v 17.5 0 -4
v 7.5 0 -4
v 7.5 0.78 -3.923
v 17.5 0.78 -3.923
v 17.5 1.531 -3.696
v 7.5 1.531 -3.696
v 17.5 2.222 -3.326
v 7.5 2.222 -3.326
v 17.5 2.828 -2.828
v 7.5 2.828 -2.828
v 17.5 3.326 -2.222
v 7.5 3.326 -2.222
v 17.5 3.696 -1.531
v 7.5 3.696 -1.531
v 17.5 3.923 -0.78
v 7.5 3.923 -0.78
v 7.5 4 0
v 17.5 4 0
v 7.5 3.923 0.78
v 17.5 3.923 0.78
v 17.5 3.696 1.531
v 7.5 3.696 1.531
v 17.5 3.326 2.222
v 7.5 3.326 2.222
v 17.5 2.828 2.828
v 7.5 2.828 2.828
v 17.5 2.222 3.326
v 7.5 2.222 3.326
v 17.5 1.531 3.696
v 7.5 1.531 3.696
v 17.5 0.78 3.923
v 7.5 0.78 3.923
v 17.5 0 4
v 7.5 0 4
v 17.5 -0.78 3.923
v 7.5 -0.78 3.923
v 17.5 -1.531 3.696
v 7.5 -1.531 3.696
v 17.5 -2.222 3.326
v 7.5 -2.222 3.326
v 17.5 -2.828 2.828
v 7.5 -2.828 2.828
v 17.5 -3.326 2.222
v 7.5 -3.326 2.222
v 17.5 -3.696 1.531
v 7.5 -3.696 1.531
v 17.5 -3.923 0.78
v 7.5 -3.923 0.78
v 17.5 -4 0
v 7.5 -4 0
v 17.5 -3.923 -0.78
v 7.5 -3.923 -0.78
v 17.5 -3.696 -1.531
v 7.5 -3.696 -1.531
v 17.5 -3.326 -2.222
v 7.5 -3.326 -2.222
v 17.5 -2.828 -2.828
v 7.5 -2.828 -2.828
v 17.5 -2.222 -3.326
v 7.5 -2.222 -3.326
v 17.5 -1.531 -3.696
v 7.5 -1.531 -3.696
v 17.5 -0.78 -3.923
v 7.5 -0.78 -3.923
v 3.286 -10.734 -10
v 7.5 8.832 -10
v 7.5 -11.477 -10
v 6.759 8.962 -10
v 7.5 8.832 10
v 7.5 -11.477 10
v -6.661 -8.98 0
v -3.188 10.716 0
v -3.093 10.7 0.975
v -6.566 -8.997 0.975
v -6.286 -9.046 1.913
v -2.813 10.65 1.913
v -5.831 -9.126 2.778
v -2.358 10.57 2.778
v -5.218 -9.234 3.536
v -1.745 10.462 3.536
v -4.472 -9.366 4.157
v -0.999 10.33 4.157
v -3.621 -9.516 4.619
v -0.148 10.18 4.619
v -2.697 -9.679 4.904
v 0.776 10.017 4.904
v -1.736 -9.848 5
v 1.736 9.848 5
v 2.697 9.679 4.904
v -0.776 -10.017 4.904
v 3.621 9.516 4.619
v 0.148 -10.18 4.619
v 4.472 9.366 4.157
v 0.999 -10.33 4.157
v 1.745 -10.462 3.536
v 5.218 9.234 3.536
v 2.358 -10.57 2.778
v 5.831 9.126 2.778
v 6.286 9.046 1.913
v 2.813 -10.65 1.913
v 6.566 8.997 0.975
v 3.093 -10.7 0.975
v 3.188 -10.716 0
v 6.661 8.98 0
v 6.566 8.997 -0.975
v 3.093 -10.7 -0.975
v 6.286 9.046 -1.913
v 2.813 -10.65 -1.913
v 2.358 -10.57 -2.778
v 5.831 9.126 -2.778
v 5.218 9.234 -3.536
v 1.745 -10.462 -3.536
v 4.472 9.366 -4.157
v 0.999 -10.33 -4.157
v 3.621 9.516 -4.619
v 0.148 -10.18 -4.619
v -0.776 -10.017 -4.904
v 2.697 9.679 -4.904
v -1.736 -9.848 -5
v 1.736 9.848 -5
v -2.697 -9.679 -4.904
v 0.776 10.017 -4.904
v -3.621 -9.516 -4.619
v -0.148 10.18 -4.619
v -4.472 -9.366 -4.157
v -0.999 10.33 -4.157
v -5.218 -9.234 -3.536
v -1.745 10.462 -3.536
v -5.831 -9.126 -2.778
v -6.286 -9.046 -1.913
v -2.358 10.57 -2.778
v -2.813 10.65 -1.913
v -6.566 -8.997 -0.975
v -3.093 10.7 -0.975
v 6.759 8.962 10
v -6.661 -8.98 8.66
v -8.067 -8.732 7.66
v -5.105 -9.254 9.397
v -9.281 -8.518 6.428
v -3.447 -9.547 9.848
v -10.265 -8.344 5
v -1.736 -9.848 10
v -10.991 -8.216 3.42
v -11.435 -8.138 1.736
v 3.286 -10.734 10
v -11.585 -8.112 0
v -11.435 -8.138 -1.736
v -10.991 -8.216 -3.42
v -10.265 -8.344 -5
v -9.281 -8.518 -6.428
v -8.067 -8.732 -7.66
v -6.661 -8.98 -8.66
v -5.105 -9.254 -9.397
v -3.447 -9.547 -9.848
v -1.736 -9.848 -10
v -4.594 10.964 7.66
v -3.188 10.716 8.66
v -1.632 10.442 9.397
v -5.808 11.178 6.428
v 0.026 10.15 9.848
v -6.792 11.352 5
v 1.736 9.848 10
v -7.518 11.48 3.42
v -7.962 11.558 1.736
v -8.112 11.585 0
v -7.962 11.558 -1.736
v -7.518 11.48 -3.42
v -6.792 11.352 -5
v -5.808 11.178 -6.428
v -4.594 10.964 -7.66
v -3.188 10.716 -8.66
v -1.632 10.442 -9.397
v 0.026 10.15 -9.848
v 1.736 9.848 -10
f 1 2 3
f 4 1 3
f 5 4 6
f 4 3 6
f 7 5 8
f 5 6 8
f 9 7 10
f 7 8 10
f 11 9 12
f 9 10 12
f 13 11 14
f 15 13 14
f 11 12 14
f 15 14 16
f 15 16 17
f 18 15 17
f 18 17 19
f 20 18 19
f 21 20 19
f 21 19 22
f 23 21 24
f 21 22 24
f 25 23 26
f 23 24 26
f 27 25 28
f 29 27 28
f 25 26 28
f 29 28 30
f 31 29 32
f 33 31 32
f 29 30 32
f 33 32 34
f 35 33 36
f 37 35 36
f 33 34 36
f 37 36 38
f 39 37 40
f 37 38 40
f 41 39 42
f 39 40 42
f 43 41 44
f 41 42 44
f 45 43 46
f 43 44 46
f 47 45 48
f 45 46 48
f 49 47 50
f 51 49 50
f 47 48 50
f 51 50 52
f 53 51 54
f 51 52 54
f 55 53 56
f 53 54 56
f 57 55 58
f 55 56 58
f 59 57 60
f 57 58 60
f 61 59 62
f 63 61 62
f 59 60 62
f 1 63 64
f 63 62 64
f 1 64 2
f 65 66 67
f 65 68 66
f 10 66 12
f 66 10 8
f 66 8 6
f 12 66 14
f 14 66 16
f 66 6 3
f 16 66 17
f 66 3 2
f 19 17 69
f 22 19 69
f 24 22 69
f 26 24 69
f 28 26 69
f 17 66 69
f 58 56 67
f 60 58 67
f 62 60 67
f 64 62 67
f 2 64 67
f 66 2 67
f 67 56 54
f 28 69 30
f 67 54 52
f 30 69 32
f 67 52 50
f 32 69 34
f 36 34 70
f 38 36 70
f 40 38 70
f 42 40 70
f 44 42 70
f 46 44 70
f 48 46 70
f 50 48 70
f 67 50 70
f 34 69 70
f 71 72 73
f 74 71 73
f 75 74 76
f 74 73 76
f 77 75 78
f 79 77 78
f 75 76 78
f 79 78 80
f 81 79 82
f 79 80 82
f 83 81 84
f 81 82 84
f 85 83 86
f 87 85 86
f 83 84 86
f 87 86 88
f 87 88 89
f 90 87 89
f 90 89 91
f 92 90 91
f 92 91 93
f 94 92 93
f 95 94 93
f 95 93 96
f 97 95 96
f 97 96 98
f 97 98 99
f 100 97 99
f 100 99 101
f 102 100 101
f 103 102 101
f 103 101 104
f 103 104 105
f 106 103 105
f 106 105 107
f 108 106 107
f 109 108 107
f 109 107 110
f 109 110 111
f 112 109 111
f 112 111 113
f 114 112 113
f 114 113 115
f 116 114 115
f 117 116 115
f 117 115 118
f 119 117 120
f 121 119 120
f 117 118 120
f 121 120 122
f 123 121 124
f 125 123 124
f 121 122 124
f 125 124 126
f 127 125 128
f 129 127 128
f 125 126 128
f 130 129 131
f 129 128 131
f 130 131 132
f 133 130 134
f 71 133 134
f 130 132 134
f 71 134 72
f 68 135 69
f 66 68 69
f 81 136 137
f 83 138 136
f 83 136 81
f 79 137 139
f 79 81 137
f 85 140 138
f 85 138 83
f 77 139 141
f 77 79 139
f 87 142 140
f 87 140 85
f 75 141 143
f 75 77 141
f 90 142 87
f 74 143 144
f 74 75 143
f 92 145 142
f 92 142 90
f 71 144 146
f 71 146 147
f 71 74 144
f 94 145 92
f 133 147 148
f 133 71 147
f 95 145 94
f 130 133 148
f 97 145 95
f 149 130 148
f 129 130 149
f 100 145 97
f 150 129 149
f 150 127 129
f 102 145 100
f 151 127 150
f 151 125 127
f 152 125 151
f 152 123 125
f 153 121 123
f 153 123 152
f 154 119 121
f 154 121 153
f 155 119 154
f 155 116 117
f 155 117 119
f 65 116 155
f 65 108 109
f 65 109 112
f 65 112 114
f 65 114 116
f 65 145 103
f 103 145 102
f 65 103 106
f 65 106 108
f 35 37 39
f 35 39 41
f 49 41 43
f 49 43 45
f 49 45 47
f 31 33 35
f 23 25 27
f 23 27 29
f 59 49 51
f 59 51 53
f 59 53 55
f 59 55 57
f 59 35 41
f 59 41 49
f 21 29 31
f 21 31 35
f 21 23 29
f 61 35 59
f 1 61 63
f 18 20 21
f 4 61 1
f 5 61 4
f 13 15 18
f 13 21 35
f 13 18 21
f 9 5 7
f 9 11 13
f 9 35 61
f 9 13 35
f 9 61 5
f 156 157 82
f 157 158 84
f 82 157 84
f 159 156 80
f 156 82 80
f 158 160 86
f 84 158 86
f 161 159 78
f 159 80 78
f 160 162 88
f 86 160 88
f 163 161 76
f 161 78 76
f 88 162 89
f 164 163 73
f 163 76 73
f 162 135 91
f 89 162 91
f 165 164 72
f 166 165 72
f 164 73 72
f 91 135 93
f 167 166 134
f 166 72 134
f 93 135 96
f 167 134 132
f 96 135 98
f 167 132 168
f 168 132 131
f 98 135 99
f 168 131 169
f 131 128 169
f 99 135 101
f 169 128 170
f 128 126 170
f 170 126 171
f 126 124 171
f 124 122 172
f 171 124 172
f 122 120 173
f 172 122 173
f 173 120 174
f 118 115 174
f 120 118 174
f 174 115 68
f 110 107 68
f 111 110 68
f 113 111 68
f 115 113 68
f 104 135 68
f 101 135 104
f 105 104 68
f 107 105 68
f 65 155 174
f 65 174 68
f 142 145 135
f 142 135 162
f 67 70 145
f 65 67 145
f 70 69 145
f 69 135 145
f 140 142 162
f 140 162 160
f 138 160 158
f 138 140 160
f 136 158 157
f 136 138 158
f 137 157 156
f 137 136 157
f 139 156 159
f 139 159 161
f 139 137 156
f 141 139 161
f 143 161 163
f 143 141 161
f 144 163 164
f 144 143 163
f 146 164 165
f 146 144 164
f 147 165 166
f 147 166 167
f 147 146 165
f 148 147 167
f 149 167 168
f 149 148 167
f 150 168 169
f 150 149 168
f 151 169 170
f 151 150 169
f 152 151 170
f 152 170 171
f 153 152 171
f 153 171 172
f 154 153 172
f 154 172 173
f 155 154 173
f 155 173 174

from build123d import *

# Parameters (mm, degrees)
EXTRUDE_3_DEPTH      = 10
EXTRUDE_3_DEPTH_BACK = 10
SKETCH_3_R           = 5
CUT_EXTRUDE_1_DEPTH  = 27.477518989
EXTRUDE_6_DEPTH      = 10
EXTRUDE_6_DEPTH_BACK = 10
SKETCH_9_R           = 4
EXTRUDE_8_DEPTH      = 10


with BuildPart() as part:
    # Sketch 3D_4 → ﾎﾞｽ - 押し出し3 (new, two sides: drawn at the far end of the back side and taken through both)
    with BuildSketch(Plane(origin=(0, 0, -10), x_dir=(0.24333901077648587, -0.042907233058801585, 0.9689917931466494), z_dir=(0.17364817766692725, 0.9848077530122086, 0)).offset(-EXTRUDE_3_DEPTH_BACK)):
        with BuildLine():
            Line((0, 0), (1.260173827, 4.941858145))
            Line((1.260173827, 4.941858145), (20.64000969, 0))
            Line((20.64000969, 0), (19.379835863, -4.941858145))
            ThreePointArc((19.379835863, -4.941858145), (7.218988859, -12.160847004), (0, 0))
        make_face()
    extrude(amount=EXTRUDE_3_DEPTH + EXTRUDE_3_DEPTH_BACK)

    # ｽｹｯﾁ3 → ｶｯﾄ - 押し出し1 (cut, through all)
    with BuildSketch(Plane(origin=(1.736481777, 9.84807753, 0), x_dir=(0.9848077530122086, -0.17364817766692736, 0), z_dir=(0.17364817766692736, 0.9848077530122086, 0))):
        Circle(SKETCH_3_R)
    extrude(amount=-CUT_EXTRUDE_1_DEPTH, mode=Mode.SUBTRACT)

    # Sketch 3D_9 → ﾎﾞｽ - 押し出し6 (add, two sides: drawn at the far end of the back side and taken through both)
    with BuildSketch(Plane(origin=(7.5, 8.831813764, 0), x_dir=(0, -1, 0), z_dir=(0, 0, -1)).offset(-EXTRUDE_6_DEPTH_BACK)):
        Polygon((0, 0), (20.308532238, 0), (19.565497, 4.213962236), (-0.13065806, 0.740998683), align=None)
    extrude(amount=EXTRUDE_6_DEPTH + EXTRUDE_6_DEPTH_BACK)

    # ｽｹｯﾁ9 → ﾎﾞｽ - 押し出し8 (add)
    with BuildSketch(Plane(origin=(7.5, 0, 0), x_dir=(0, 0, -1), z_dir=(1, 0, 0))):
        Circle(SKETCH_9_R)
    extrude(amount=EXTRUDE_8_DEPTH)


solid = part.part
